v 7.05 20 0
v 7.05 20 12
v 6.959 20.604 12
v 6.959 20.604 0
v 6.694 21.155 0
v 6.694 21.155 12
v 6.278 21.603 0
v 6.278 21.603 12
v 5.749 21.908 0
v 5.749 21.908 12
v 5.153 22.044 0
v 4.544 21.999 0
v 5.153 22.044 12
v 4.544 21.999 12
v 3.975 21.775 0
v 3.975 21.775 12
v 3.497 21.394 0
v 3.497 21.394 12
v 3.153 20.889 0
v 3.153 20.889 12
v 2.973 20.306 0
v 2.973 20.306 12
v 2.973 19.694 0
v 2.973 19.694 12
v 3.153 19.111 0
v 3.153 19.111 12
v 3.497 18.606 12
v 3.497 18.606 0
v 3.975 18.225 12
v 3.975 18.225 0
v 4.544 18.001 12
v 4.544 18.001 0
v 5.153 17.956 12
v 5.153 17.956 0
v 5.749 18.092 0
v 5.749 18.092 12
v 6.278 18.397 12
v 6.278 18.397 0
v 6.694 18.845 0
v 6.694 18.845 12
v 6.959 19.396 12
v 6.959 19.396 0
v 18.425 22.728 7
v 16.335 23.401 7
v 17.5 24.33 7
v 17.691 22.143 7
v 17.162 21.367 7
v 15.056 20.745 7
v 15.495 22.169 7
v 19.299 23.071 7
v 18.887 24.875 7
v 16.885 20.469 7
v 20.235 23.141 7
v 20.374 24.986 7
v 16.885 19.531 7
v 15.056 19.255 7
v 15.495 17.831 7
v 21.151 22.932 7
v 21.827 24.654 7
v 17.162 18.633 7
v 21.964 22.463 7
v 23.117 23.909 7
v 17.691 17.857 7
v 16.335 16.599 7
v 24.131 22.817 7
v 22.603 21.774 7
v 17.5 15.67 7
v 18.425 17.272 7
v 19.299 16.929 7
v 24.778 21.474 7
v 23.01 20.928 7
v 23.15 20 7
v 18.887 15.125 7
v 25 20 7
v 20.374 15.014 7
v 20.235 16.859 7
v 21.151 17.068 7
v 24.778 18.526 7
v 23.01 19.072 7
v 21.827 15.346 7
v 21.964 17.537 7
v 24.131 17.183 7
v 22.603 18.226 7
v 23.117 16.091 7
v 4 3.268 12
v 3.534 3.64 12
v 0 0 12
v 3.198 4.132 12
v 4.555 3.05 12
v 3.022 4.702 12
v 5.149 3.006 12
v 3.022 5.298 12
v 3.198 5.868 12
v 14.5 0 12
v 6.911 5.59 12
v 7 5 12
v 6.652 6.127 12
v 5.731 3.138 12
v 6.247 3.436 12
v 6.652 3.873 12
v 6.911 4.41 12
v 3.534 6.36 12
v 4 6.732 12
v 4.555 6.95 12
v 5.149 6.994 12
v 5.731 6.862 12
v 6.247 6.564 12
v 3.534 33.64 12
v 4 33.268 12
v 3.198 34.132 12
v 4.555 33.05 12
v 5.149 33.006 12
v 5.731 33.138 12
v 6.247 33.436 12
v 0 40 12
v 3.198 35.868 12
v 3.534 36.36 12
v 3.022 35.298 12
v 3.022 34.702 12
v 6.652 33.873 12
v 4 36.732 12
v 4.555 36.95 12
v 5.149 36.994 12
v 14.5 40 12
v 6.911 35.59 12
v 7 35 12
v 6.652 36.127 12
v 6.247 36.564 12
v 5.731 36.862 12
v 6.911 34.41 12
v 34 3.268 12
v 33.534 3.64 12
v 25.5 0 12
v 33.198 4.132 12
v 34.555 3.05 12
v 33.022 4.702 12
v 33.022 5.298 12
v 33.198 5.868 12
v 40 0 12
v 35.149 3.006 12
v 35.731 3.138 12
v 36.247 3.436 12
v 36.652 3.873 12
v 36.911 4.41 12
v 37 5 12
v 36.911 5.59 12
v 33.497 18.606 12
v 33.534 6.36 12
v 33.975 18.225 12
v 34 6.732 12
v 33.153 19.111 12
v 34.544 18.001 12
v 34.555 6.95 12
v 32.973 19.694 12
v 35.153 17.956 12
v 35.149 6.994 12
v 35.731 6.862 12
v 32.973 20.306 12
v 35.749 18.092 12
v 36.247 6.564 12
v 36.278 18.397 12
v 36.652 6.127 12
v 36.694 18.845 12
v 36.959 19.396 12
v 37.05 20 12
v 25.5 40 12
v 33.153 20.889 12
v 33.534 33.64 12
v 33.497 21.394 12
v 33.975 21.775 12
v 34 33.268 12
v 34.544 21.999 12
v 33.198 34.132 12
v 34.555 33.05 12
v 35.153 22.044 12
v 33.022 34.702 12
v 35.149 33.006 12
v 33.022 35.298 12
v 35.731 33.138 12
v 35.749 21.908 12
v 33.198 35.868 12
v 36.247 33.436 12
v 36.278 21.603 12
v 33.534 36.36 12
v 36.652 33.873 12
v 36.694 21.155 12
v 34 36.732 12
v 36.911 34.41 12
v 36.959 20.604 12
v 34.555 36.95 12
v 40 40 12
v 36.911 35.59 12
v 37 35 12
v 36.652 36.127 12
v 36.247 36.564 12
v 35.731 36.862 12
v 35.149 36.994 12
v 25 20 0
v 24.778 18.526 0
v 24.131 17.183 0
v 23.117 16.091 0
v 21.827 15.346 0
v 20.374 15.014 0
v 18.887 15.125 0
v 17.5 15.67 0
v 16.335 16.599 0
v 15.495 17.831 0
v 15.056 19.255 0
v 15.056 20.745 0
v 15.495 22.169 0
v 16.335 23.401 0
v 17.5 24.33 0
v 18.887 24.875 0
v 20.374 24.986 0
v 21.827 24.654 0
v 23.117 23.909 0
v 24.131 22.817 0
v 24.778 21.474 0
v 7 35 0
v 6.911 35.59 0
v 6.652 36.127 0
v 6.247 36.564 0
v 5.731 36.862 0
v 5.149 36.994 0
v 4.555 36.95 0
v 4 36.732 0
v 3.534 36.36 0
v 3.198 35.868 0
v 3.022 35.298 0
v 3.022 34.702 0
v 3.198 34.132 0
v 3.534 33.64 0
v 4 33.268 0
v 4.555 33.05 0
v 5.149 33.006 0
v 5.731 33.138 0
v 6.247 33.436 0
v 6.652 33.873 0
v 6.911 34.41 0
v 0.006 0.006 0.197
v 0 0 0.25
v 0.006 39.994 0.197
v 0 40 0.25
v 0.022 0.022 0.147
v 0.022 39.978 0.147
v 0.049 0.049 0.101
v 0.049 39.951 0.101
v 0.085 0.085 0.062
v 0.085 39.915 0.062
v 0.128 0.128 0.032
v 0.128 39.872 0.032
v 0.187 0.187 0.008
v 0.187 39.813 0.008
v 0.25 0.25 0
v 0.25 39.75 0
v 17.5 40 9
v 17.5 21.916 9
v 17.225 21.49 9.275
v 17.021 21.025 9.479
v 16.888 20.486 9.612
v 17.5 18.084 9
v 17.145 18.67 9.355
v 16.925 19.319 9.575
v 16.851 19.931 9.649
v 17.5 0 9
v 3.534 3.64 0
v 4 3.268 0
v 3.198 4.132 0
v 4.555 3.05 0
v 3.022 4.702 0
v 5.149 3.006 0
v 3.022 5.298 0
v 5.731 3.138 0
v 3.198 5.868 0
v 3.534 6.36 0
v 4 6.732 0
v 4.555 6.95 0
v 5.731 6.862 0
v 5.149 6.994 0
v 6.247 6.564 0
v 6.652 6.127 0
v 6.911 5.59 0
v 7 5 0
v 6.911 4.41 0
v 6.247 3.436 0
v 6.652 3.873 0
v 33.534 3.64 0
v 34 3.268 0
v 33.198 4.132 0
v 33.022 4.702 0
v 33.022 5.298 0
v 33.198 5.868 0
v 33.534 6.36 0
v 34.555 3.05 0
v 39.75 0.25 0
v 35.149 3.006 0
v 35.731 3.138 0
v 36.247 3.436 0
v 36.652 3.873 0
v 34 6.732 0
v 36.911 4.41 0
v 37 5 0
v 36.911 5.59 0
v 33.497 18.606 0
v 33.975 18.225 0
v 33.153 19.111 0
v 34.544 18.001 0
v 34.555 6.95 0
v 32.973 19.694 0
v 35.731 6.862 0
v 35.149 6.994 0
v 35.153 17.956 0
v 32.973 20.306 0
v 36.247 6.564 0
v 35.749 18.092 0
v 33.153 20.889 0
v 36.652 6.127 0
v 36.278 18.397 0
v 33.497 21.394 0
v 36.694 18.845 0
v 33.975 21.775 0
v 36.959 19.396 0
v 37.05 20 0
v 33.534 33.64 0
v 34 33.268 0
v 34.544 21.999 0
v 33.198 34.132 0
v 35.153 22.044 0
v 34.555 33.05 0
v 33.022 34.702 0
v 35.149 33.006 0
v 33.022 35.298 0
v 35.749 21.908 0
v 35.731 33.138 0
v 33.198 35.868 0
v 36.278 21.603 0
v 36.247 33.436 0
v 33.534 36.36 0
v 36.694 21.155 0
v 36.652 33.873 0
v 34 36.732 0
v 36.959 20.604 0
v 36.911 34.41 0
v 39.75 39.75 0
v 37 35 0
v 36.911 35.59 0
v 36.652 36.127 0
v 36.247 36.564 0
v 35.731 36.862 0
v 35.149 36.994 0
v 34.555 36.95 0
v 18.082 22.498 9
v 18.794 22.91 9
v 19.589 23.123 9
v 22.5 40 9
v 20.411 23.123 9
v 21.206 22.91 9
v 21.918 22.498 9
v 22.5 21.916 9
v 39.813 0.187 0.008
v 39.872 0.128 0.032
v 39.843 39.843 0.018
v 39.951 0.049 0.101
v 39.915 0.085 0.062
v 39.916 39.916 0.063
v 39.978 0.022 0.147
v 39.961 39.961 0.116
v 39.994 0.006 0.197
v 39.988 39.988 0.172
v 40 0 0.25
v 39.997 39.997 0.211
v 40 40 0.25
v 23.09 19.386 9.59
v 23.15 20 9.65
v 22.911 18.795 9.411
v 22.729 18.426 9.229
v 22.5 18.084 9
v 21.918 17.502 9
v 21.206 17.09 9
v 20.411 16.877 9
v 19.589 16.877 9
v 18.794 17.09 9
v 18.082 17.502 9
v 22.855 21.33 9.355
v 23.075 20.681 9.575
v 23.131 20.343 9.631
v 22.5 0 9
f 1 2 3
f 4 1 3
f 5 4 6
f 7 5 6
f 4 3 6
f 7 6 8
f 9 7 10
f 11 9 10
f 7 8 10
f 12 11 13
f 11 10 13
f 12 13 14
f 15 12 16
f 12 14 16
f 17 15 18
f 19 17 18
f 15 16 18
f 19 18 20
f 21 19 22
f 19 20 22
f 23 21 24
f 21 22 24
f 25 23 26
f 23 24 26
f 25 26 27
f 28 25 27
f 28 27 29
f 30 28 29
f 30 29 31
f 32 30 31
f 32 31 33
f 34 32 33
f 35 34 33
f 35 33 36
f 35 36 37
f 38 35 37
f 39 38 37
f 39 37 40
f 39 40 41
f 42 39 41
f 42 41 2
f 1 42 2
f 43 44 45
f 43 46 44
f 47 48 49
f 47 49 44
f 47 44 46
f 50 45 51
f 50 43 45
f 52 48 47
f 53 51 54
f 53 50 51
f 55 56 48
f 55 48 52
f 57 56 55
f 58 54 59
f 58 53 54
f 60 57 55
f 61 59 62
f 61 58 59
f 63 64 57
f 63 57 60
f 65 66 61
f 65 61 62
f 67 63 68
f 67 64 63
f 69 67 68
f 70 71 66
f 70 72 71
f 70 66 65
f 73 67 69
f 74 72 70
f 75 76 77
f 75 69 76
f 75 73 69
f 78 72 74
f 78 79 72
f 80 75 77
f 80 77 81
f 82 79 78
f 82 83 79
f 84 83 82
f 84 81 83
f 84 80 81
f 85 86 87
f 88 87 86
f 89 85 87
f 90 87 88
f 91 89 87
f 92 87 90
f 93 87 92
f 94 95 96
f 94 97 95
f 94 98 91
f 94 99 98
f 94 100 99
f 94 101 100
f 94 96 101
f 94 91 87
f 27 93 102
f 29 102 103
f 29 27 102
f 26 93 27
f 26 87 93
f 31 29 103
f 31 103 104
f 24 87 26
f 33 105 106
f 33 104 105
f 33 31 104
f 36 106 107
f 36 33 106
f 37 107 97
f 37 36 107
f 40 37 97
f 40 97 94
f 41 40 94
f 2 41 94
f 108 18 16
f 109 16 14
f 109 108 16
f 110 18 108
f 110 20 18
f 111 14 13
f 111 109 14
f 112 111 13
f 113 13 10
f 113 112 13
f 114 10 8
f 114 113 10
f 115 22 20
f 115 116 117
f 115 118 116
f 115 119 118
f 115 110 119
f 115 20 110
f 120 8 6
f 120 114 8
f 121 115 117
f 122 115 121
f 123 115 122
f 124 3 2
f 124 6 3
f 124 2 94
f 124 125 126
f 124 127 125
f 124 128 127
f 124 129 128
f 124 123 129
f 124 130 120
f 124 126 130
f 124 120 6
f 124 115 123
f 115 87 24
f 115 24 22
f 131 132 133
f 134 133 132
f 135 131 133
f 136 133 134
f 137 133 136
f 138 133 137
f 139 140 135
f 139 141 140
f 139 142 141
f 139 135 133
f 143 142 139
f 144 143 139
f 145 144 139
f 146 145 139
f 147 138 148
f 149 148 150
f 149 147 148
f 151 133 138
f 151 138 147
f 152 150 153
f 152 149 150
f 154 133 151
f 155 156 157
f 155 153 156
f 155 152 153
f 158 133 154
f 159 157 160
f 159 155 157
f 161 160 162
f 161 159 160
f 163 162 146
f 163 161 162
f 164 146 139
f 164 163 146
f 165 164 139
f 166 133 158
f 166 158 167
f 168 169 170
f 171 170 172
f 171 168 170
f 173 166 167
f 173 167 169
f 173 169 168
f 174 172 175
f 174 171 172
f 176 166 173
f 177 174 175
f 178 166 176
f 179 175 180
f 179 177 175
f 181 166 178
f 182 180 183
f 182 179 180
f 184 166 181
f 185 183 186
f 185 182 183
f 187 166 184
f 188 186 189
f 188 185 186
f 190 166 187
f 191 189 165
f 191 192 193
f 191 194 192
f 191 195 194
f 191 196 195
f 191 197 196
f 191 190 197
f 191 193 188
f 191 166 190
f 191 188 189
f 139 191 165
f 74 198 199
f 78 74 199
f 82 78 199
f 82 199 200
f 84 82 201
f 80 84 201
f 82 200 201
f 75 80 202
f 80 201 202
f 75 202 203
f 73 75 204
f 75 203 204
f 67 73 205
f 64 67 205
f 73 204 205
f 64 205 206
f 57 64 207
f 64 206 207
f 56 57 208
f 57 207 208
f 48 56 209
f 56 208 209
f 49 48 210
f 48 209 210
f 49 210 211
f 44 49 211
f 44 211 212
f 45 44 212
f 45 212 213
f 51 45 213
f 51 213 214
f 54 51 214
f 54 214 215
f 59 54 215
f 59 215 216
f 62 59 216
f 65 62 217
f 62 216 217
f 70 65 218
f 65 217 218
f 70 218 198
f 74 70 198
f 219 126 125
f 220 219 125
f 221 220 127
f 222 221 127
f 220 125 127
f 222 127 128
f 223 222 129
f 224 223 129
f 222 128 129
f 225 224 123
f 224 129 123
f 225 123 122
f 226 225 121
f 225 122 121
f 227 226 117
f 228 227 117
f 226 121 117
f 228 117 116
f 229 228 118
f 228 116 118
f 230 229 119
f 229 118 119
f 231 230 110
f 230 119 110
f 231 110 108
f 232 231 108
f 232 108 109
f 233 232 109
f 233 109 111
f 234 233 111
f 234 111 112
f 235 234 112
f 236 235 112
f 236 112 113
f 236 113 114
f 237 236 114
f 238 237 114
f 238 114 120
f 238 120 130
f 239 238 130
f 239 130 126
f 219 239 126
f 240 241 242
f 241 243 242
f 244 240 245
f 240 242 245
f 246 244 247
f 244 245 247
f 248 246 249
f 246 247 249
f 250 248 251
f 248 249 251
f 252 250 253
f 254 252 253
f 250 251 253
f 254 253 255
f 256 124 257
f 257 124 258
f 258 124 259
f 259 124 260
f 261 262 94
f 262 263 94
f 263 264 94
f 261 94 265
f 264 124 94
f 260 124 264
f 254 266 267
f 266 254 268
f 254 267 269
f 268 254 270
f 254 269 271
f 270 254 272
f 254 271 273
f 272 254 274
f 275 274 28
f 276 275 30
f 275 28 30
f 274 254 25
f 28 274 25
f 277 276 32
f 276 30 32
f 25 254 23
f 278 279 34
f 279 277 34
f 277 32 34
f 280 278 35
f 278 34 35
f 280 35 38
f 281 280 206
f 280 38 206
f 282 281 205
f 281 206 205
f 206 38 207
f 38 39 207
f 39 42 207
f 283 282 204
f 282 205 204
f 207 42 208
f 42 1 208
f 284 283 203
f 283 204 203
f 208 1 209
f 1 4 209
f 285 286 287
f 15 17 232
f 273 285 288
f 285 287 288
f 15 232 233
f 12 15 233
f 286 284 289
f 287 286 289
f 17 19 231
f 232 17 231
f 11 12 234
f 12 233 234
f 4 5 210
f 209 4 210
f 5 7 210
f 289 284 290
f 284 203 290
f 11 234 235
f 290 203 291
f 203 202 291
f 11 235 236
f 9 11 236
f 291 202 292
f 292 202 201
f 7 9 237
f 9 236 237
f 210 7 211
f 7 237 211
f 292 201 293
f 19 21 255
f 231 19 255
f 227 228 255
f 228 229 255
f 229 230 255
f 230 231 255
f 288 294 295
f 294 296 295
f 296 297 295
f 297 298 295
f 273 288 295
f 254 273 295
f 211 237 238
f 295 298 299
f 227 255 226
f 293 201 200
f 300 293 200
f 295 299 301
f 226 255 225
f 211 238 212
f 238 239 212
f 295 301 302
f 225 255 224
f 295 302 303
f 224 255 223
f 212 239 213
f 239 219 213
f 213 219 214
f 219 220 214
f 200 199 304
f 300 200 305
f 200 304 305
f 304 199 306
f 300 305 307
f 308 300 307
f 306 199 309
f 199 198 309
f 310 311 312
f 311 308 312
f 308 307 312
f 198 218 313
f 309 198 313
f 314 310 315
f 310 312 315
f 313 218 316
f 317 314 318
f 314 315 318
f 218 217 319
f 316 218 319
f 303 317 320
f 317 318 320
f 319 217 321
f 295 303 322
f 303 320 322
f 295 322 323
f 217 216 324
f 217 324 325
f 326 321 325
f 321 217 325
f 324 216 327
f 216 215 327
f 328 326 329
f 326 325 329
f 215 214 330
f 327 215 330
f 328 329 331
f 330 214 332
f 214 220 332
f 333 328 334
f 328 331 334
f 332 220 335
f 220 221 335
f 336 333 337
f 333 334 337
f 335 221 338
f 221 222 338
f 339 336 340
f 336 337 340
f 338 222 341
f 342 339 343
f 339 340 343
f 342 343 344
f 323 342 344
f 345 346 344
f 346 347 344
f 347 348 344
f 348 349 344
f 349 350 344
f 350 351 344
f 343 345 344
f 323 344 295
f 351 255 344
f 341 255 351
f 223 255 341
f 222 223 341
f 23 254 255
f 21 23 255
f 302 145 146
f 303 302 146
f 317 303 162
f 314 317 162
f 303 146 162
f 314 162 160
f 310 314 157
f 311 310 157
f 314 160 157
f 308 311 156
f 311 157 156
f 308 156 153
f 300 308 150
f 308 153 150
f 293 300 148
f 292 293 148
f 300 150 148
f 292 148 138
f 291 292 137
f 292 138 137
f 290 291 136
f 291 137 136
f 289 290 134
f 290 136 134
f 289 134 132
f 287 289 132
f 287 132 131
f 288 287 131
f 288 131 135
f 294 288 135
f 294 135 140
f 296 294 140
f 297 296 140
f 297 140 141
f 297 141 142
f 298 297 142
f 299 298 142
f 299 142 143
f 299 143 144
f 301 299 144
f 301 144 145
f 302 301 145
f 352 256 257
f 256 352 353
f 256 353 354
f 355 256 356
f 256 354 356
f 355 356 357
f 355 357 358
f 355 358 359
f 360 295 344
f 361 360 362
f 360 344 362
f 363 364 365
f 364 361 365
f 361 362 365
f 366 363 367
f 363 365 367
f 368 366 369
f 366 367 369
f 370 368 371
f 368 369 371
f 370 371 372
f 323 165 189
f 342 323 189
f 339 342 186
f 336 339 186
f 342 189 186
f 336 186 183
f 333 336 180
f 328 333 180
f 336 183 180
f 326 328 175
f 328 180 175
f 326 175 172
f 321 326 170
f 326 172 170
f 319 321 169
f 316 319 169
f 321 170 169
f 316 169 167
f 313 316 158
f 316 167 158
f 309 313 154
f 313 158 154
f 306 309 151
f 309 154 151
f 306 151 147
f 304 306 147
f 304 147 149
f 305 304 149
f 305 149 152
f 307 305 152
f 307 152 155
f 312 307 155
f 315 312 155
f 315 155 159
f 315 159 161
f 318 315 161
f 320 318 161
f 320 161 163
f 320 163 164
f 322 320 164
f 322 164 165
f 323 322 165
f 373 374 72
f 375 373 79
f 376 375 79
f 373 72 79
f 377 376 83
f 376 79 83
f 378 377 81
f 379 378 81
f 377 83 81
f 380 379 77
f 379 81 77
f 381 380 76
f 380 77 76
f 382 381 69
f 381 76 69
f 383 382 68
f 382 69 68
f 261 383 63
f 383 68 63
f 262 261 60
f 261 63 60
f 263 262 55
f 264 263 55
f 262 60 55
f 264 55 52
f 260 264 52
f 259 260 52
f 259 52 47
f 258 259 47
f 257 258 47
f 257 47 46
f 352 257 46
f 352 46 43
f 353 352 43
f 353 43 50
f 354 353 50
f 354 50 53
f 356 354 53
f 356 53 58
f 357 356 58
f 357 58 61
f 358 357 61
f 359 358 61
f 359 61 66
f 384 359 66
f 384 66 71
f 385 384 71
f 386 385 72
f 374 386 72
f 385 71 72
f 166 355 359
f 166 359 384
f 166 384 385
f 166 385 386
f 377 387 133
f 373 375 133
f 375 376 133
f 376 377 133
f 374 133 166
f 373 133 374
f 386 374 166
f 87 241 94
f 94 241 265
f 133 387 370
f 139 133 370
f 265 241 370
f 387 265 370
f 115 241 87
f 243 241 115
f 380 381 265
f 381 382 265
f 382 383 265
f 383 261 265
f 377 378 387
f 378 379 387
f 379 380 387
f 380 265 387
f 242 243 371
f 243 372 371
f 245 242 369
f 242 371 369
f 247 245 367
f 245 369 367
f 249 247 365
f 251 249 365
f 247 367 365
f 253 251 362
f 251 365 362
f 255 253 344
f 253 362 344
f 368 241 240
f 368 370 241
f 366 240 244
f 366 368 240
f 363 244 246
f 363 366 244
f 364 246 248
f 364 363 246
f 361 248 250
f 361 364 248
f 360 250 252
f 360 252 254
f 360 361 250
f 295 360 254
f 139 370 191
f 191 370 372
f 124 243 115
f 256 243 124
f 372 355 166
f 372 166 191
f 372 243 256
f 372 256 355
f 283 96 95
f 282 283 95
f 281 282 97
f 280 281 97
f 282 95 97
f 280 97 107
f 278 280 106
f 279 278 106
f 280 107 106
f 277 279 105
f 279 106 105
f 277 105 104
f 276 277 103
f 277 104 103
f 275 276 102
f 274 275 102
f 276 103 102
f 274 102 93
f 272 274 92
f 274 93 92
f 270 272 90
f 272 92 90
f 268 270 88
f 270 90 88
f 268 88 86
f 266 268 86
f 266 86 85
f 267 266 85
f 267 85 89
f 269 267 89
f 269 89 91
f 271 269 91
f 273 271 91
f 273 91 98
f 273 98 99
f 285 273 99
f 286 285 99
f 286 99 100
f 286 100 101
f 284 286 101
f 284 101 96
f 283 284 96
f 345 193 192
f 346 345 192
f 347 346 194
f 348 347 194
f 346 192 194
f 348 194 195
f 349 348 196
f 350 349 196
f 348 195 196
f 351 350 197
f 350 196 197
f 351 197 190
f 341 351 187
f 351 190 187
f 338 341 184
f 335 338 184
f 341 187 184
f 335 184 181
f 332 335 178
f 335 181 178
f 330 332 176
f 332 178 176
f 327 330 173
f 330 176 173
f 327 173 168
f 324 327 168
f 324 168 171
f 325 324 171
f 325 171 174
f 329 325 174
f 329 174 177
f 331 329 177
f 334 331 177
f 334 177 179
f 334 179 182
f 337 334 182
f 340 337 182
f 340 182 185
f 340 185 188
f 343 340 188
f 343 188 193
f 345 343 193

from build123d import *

# Parameters (mm, degrees)
F0_W      = 40
F0_H      = 40
F1_DEPTH  = 12
F3_DEPTH  = 40.001
F4_R      = 2
F5_DEPTH  = 12.001
F6_R      = 2.05
F7_DEPTH  = 12.001
F8_R      = 0.25
F9_R      = 3.15
F10_DEPTH = 12.001
F11_R     = 5
F12_DEPTH = 7


with BuildPart() as f1:
    # F0 (on Top) → F1 (new body)
    with BuildSketch(Plane.XY):
        with Locations((20, 20)):
            Rectangle(F0_W, F0_H)
    extrude(amount=F1_DEPTH)

    # F2 (on face) → F3 (cut, through all)
    with BuildSketch(Plane.XZ):
        Polygon((14.5, 12), (17.5, 9), (22.5, 9), (25.5, 12), align=None)
    extrude(amount=-F3_DEPTH, mode=Mode.SUBTRACT)

    # F4 (on face) → F5 (cut, through all)
    with BuildSketch(Plane.XY.offset(12)):
        with Locations((5, 5)):
            Circle(F4_R)
        with Locations((5, 35)):
            Circle(F4_R)
        with Locations((35, 5)):
            Circle(F4_R)
        with Locations((35, 35)):
            Circle(F4_R)
    extrude(amount=-F5_DEPTH, mode=Mode.SUBTRACT)

    # F6 (on face) → F7 (cut, through all)
    with BuildSketch(Plane.XY.offset(12)):
        with Locations((5, 20)):
            Circle(F6_R)
        with Locations((35, 20)):
            Circle(F6_R)
    extrude(amount=-F7_DEPTH, mode=Mode.SUBTRACT)

    # F8
    f8_edges = [f1.edges().sort_by_distance(p)[0] for p in [
        (20, 0, 0),
        (0, 20, 0),
        (40, 20, 0),
        (20, 40, 0),
    ]]
    fillet(f8_edges, radius=F8_R)

    # F9 (on face) → F10 (cut, through all)
    with BuildSketch(Plane(origin=(0, 0, 0), x_dir=(1, 0, 0), z_dir=(0, 0, -1))):
        with Locations((20, -20)):
            Circle(F9_R)
    extrude(amount=-F10_DEPTH, mode=Mode.SUBTRACT)

    # F11 (on face) → F12 (cut)
    with BuildSketch(Plane(origin=(0, 0, 0), x_dir=(1, 0, 0), z_dir=(0, 0, -1))):
        with Locations((20, -20)):
            Circle(F11_R)
    extrude(amount=-F12_DEPTH, mode=Mode.SUBTRACT)


solid = f1.part
